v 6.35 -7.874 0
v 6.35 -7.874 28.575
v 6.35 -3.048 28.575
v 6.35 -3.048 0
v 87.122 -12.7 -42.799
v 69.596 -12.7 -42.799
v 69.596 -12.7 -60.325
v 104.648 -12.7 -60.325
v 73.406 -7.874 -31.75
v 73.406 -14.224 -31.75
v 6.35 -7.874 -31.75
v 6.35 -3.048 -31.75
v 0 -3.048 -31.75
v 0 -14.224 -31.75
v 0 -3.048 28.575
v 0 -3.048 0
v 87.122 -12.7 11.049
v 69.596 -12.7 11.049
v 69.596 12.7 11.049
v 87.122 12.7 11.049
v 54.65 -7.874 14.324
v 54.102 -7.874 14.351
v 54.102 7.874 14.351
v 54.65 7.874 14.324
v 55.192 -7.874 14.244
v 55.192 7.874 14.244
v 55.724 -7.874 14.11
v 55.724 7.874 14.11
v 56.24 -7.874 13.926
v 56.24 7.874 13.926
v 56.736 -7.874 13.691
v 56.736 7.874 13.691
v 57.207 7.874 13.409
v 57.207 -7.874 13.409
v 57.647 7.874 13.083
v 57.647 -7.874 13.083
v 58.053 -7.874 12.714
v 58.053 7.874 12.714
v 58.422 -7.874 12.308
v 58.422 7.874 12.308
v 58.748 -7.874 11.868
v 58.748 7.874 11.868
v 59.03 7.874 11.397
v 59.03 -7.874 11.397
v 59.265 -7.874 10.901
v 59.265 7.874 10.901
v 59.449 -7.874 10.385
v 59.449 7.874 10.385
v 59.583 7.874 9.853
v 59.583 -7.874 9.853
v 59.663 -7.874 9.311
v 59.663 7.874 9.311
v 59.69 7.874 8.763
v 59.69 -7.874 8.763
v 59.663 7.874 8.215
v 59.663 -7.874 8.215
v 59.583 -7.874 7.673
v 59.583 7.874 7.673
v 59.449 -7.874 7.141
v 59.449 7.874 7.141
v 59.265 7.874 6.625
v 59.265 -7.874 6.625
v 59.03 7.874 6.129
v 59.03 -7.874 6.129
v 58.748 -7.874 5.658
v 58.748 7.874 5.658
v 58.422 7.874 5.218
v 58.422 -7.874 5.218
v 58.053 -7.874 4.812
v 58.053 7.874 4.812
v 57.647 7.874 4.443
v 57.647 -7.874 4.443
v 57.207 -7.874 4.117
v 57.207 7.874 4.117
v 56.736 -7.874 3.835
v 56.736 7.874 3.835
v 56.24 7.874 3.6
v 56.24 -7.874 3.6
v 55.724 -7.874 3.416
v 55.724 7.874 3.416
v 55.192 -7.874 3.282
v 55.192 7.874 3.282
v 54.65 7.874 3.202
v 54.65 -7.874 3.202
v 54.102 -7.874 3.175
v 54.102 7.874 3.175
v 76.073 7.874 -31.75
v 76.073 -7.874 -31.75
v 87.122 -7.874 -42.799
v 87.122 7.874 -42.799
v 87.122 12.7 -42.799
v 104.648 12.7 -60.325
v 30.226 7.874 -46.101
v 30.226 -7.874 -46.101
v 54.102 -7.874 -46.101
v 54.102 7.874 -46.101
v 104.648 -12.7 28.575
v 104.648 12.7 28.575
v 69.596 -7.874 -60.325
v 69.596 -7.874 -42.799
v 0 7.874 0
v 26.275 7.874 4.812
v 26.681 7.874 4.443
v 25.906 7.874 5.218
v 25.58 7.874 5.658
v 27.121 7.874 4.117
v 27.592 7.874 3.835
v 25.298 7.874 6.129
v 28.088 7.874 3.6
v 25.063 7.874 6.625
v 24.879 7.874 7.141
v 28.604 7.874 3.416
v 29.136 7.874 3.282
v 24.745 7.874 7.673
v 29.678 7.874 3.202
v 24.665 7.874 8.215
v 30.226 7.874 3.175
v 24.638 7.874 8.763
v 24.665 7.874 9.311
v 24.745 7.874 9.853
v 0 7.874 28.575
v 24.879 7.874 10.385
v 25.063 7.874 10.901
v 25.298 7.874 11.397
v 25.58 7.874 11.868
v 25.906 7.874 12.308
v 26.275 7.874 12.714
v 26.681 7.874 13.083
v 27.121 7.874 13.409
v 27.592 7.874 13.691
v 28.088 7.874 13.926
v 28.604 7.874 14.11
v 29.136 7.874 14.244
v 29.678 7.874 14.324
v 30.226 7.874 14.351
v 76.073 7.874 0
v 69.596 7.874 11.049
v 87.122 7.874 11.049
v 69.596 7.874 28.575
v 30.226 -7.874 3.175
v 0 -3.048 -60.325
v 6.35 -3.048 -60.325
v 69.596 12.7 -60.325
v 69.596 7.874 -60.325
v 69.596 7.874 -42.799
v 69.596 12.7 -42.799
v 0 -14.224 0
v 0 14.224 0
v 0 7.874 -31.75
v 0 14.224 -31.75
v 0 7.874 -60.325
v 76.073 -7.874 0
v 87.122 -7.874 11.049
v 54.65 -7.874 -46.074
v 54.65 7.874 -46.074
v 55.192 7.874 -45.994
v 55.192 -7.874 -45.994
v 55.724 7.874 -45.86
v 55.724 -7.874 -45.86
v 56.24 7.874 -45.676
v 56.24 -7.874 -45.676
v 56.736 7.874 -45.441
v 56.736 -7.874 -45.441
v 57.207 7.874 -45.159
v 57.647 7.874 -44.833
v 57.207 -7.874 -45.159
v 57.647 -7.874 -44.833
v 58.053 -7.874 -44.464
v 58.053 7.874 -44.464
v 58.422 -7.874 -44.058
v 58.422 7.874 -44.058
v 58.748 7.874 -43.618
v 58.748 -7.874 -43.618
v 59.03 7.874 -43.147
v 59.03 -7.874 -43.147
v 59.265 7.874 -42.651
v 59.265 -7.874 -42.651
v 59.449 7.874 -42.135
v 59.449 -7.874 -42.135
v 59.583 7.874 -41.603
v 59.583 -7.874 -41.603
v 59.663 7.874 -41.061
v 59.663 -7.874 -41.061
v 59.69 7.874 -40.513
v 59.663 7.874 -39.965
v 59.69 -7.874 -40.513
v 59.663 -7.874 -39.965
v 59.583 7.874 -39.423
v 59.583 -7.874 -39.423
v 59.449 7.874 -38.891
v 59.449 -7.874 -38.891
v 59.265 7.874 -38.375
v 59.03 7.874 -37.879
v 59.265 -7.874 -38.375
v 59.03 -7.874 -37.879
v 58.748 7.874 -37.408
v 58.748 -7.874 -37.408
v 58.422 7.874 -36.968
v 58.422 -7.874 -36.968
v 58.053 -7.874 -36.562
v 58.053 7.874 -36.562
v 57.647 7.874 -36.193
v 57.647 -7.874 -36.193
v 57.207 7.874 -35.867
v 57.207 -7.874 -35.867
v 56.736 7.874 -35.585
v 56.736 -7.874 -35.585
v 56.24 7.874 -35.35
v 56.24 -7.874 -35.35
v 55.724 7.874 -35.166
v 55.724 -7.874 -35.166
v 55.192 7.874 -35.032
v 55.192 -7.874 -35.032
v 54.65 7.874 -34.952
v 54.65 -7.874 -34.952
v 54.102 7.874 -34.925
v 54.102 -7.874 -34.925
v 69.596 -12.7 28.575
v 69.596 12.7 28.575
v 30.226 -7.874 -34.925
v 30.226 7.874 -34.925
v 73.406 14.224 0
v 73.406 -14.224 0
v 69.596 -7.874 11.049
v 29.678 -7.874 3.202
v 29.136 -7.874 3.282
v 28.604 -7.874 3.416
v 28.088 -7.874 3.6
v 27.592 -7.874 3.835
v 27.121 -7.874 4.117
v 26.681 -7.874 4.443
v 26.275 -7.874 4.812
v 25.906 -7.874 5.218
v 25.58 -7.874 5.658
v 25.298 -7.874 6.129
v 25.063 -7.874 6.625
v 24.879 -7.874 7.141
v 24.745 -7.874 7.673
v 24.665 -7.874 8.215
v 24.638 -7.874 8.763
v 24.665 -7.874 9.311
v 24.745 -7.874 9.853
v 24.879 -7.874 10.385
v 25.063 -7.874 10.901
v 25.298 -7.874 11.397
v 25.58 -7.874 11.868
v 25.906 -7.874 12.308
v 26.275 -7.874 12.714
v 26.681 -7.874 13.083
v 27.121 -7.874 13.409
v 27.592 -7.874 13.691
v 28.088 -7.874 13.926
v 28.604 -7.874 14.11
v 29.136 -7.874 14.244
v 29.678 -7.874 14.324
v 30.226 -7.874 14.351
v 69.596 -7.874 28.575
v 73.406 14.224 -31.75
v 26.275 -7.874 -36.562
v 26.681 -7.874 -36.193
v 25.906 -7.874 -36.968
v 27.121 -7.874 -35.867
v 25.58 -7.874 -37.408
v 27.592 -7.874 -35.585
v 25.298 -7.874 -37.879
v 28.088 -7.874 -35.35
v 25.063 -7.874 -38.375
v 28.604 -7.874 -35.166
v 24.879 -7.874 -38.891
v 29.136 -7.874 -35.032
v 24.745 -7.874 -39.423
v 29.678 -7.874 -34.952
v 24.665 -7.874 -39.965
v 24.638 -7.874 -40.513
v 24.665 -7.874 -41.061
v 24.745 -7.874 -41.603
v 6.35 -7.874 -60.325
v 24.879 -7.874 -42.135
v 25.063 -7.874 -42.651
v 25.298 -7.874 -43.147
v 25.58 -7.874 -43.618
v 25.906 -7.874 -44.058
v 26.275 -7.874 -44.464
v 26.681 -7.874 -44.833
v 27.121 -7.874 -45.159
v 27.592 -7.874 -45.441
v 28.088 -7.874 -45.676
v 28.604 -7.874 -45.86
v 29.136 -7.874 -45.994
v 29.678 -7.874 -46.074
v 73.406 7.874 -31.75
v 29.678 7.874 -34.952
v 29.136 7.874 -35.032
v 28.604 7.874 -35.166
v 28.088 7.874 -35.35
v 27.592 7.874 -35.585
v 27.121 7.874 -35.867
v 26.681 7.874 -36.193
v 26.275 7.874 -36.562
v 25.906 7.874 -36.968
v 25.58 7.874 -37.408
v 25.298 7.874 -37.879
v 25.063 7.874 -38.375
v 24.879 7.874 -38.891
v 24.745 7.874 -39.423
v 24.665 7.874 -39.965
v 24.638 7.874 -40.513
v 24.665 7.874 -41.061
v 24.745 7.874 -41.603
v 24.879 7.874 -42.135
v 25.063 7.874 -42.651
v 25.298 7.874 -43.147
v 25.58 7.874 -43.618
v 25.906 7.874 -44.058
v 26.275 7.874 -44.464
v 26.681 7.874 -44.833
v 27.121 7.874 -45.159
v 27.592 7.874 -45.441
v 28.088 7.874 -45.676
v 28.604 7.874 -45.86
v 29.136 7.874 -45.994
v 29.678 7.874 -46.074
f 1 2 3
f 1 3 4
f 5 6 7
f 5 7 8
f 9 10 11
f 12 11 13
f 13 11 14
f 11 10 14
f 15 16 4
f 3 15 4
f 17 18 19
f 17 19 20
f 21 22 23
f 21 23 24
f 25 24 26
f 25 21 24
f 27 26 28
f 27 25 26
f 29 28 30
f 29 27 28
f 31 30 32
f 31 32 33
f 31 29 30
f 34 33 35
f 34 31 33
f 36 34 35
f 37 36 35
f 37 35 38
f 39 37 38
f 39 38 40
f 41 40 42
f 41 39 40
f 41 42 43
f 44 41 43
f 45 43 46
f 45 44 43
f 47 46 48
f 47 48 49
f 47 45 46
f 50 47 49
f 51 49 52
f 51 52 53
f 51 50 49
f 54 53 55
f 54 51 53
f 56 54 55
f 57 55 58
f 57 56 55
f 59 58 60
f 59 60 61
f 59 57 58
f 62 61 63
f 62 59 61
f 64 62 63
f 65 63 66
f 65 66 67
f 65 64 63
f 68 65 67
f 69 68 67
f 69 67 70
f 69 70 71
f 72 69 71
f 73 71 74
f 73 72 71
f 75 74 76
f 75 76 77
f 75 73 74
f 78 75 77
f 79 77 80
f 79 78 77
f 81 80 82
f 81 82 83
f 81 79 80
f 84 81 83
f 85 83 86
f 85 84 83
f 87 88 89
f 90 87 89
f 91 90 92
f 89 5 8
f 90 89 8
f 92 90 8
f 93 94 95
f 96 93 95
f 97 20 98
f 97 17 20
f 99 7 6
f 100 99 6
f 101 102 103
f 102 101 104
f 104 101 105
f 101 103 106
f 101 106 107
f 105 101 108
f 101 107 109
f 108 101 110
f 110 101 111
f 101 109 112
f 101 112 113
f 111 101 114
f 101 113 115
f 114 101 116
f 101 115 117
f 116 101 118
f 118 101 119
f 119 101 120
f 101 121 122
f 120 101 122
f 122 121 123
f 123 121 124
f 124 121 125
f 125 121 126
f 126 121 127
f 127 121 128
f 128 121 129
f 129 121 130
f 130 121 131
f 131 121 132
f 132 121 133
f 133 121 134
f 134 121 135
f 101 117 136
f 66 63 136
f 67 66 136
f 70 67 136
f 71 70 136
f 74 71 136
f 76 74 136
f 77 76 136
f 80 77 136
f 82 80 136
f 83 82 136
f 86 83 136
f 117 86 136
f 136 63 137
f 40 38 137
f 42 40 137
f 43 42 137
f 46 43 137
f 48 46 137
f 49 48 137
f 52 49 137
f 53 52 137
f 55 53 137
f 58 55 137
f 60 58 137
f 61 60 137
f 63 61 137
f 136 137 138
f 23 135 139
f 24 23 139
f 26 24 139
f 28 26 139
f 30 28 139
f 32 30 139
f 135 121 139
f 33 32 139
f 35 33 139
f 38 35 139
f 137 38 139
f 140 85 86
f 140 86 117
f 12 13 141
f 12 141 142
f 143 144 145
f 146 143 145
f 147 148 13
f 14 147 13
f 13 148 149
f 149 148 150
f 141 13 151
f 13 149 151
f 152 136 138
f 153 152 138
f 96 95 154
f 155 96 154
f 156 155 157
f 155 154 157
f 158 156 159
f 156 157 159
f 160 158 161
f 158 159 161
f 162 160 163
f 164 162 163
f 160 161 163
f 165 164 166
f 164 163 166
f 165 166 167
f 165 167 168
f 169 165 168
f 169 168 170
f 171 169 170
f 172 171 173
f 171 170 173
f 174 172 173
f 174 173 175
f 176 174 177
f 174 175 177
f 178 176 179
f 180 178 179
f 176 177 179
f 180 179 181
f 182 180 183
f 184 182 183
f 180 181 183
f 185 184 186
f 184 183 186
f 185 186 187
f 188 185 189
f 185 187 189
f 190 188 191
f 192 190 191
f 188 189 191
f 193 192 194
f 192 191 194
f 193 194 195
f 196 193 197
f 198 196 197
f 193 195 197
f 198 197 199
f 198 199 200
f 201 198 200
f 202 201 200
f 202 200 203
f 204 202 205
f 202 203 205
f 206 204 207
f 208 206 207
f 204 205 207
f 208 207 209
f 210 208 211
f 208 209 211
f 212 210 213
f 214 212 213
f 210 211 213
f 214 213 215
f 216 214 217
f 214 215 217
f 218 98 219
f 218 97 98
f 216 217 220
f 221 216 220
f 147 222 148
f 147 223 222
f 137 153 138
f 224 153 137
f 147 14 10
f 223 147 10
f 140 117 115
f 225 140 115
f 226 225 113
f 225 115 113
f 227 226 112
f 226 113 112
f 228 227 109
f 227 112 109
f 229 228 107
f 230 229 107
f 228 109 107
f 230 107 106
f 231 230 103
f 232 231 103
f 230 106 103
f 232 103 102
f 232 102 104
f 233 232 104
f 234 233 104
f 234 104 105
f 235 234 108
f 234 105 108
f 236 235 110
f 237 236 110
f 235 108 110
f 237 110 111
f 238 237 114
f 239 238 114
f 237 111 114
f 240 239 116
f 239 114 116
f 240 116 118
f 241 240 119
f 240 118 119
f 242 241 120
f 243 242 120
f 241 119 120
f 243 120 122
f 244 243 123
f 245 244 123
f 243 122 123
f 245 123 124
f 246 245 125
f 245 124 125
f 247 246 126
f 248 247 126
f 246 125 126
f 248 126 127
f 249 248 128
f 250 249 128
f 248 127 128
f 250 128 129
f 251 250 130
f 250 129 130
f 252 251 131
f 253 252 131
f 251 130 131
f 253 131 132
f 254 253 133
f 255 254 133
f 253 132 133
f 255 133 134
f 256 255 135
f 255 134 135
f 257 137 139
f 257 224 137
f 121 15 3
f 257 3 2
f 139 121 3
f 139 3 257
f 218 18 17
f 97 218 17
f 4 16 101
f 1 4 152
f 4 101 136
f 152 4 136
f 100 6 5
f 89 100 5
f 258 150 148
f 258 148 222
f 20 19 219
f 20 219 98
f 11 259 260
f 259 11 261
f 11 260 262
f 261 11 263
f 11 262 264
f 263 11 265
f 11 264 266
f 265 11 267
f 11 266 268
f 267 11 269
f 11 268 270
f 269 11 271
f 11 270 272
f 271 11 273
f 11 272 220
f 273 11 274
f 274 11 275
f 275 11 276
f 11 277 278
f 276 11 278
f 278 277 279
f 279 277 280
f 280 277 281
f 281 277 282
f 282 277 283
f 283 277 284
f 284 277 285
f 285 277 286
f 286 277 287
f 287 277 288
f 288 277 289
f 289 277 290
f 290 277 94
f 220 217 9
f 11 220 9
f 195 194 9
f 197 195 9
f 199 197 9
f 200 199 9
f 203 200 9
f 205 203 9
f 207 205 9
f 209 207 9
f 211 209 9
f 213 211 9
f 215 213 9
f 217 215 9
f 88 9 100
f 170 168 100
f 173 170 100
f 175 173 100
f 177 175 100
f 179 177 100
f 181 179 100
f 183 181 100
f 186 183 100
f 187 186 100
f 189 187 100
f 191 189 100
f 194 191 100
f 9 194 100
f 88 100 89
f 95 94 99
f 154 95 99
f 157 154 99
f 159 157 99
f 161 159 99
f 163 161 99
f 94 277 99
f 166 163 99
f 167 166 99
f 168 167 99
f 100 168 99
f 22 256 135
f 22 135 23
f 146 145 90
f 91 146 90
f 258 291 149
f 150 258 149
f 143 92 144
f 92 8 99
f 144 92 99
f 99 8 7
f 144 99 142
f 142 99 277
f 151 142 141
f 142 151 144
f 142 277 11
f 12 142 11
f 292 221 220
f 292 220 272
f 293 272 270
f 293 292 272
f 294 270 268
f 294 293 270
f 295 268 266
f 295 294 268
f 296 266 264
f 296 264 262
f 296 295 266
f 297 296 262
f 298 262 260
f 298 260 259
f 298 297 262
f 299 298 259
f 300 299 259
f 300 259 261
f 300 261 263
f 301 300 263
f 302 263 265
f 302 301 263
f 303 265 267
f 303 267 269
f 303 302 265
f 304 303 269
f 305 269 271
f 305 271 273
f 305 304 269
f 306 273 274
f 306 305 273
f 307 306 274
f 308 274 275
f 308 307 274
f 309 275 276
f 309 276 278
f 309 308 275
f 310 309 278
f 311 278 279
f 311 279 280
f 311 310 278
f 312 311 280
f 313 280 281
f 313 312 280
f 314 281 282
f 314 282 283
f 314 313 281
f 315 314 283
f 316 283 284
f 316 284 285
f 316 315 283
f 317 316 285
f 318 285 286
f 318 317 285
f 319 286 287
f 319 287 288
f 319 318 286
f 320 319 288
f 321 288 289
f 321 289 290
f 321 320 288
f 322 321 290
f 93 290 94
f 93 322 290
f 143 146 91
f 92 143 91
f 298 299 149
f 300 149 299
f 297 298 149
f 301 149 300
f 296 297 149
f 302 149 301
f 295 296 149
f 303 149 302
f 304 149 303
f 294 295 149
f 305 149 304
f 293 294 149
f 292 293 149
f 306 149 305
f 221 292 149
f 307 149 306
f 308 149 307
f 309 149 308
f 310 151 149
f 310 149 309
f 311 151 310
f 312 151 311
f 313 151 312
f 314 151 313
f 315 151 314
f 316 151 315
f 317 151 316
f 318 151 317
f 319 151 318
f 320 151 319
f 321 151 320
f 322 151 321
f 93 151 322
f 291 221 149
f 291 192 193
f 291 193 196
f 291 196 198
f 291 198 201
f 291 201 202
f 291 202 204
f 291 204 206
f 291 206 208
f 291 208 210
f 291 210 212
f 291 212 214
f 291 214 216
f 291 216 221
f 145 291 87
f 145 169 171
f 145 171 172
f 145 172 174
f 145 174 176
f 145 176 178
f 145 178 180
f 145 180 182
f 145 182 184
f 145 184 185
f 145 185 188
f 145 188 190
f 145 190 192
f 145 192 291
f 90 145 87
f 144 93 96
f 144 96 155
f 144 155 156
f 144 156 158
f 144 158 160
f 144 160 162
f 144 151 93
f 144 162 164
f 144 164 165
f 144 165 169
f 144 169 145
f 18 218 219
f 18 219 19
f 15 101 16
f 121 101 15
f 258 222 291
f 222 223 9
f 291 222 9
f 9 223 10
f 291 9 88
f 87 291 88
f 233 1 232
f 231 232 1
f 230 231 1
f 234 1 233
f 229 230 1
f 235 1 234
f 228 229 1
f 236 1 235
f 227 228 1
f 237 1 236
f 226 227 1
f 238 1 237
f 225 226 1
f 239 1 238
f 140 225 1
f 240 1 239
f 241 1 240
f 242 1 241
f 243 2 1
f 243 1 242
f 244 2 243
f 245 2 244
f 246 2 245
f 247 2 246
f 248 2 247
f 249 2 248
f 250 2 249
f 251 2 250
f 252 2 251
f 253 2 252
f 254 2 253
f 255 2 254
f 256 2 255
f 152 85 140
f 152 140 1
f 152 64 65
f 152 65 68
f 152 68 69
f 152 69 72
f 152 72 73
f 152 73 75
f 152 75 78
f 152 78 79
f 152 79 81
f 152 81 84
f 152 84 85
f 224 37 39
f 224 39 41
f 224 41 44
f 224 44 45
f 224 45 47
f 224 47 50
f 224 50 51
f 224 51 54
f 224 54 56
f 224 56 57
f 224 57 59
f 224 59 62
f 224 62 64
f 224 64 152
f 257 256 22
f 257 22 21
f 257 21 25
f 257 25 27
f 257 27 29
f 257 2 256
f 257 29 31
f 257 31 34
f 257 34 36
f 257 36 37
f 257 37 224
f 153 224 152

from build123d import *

# Parameters (mm, degrees)
F1_DEPTH = 14.224
F2_DEPTH = 12.7
F3_DEPTH = 7.874
F0_W     = 6.35
F0_H     = 28.575
F4_DEPTH = 7.874
F5_DEPTH = 3.048


with BuildPart() as f1:
    # F0 (on Front) → F1 (new body, symmetric)
    with BuildSketch(Plane.XZ):
        Polygon((6.35, 0), (0, 0), (0, -15.875), (73.406, -15.875), (73.406, 0), align=None)
    extrude(amount=F1_DEPTH, both=True)

    # F6: F1, F3, F2 across face


with BuildPart() as f2:
    # F0 (on Front) → F2 (new body, symmetric)
    with BuildSketch(Plane.XZ):
        Polygon((104.648, 28.575), (69.596, 28.575), (69.596, 11.049), (87.122, 11.049), align=None)
    extrude(amount=F2_DEPTH, both=True)


with BuildPart() as f3:
    # F0 (on Front) → F3 (new body, symmetric)
    with BuildSketch(Plane.XZ):
        Polygon((69.596, 28.575), (6.35, 28.575), (6.35, 0), (73.406, 0), (76.073, 0), (87.122, 11.049), (69.596, 11.049), align=None)
        with BuildLine():
            ThreePointArc((30.226, 3.175), (24.638, 8.763), (30.226, 14.351))
            Line((30.226, 14.351), (54.102, 14.351))
            ThreePointArc((54.102, 14.351), (58.0533126933, 12.7143126933), (59.69, 8.763))
            ThreePointArc((59.69, 8.763), (58.0533126933, 4.8116873067), (54.102, 3.175))
            Line((54.102, 3.175), (30.226, 3.175))
        make_face(mode=Mode.SUBTRACT)
    extrude(amount=F3_DEPTH, both=True)



with BuildPart() as f4:
    # F0 (on Front) → F4 (new body)
    with BuildSketch(Plane.XZ):
        with Locations((3.175, 14.2875)):
            Rectangle(F0_W, F0_H)
    extrude(amount=-F4_DEPTH)


with BuildPart() as f3_1:
    add(f3.part)

    add(f4.part)  # F5 merges F4
    # F0 (on Front) → F5 (join)
    with BuildSketch(Plane.XZ):
        with Locations((3.175, 14.2875)):
            Rectangle(F0_W, F0_H)
    extrude(amount=F5_DEPTH)


with BuildPart() as f1_1:
    add(f1.part)
    add(f1.part.mirror(Plane(origin=(36.703, 0, -15.875), x_dir=(1, 0, 0), z_dir=(0, 0, -1))))
    add(f3_1.part.mirror(Plane(origin=(36.703, 0, -15.875), x_dir=(1, 0, 0), z_dir=(0, 0, -1))))
    add(f2.part.mirror(Plane(origin=(36.703, 0, -15.875), x_dir=(1, 0, 0), z_dir=(0, 0, -1))))


solid = Compound([f2.part, f3_1.part, f1_1.part])
